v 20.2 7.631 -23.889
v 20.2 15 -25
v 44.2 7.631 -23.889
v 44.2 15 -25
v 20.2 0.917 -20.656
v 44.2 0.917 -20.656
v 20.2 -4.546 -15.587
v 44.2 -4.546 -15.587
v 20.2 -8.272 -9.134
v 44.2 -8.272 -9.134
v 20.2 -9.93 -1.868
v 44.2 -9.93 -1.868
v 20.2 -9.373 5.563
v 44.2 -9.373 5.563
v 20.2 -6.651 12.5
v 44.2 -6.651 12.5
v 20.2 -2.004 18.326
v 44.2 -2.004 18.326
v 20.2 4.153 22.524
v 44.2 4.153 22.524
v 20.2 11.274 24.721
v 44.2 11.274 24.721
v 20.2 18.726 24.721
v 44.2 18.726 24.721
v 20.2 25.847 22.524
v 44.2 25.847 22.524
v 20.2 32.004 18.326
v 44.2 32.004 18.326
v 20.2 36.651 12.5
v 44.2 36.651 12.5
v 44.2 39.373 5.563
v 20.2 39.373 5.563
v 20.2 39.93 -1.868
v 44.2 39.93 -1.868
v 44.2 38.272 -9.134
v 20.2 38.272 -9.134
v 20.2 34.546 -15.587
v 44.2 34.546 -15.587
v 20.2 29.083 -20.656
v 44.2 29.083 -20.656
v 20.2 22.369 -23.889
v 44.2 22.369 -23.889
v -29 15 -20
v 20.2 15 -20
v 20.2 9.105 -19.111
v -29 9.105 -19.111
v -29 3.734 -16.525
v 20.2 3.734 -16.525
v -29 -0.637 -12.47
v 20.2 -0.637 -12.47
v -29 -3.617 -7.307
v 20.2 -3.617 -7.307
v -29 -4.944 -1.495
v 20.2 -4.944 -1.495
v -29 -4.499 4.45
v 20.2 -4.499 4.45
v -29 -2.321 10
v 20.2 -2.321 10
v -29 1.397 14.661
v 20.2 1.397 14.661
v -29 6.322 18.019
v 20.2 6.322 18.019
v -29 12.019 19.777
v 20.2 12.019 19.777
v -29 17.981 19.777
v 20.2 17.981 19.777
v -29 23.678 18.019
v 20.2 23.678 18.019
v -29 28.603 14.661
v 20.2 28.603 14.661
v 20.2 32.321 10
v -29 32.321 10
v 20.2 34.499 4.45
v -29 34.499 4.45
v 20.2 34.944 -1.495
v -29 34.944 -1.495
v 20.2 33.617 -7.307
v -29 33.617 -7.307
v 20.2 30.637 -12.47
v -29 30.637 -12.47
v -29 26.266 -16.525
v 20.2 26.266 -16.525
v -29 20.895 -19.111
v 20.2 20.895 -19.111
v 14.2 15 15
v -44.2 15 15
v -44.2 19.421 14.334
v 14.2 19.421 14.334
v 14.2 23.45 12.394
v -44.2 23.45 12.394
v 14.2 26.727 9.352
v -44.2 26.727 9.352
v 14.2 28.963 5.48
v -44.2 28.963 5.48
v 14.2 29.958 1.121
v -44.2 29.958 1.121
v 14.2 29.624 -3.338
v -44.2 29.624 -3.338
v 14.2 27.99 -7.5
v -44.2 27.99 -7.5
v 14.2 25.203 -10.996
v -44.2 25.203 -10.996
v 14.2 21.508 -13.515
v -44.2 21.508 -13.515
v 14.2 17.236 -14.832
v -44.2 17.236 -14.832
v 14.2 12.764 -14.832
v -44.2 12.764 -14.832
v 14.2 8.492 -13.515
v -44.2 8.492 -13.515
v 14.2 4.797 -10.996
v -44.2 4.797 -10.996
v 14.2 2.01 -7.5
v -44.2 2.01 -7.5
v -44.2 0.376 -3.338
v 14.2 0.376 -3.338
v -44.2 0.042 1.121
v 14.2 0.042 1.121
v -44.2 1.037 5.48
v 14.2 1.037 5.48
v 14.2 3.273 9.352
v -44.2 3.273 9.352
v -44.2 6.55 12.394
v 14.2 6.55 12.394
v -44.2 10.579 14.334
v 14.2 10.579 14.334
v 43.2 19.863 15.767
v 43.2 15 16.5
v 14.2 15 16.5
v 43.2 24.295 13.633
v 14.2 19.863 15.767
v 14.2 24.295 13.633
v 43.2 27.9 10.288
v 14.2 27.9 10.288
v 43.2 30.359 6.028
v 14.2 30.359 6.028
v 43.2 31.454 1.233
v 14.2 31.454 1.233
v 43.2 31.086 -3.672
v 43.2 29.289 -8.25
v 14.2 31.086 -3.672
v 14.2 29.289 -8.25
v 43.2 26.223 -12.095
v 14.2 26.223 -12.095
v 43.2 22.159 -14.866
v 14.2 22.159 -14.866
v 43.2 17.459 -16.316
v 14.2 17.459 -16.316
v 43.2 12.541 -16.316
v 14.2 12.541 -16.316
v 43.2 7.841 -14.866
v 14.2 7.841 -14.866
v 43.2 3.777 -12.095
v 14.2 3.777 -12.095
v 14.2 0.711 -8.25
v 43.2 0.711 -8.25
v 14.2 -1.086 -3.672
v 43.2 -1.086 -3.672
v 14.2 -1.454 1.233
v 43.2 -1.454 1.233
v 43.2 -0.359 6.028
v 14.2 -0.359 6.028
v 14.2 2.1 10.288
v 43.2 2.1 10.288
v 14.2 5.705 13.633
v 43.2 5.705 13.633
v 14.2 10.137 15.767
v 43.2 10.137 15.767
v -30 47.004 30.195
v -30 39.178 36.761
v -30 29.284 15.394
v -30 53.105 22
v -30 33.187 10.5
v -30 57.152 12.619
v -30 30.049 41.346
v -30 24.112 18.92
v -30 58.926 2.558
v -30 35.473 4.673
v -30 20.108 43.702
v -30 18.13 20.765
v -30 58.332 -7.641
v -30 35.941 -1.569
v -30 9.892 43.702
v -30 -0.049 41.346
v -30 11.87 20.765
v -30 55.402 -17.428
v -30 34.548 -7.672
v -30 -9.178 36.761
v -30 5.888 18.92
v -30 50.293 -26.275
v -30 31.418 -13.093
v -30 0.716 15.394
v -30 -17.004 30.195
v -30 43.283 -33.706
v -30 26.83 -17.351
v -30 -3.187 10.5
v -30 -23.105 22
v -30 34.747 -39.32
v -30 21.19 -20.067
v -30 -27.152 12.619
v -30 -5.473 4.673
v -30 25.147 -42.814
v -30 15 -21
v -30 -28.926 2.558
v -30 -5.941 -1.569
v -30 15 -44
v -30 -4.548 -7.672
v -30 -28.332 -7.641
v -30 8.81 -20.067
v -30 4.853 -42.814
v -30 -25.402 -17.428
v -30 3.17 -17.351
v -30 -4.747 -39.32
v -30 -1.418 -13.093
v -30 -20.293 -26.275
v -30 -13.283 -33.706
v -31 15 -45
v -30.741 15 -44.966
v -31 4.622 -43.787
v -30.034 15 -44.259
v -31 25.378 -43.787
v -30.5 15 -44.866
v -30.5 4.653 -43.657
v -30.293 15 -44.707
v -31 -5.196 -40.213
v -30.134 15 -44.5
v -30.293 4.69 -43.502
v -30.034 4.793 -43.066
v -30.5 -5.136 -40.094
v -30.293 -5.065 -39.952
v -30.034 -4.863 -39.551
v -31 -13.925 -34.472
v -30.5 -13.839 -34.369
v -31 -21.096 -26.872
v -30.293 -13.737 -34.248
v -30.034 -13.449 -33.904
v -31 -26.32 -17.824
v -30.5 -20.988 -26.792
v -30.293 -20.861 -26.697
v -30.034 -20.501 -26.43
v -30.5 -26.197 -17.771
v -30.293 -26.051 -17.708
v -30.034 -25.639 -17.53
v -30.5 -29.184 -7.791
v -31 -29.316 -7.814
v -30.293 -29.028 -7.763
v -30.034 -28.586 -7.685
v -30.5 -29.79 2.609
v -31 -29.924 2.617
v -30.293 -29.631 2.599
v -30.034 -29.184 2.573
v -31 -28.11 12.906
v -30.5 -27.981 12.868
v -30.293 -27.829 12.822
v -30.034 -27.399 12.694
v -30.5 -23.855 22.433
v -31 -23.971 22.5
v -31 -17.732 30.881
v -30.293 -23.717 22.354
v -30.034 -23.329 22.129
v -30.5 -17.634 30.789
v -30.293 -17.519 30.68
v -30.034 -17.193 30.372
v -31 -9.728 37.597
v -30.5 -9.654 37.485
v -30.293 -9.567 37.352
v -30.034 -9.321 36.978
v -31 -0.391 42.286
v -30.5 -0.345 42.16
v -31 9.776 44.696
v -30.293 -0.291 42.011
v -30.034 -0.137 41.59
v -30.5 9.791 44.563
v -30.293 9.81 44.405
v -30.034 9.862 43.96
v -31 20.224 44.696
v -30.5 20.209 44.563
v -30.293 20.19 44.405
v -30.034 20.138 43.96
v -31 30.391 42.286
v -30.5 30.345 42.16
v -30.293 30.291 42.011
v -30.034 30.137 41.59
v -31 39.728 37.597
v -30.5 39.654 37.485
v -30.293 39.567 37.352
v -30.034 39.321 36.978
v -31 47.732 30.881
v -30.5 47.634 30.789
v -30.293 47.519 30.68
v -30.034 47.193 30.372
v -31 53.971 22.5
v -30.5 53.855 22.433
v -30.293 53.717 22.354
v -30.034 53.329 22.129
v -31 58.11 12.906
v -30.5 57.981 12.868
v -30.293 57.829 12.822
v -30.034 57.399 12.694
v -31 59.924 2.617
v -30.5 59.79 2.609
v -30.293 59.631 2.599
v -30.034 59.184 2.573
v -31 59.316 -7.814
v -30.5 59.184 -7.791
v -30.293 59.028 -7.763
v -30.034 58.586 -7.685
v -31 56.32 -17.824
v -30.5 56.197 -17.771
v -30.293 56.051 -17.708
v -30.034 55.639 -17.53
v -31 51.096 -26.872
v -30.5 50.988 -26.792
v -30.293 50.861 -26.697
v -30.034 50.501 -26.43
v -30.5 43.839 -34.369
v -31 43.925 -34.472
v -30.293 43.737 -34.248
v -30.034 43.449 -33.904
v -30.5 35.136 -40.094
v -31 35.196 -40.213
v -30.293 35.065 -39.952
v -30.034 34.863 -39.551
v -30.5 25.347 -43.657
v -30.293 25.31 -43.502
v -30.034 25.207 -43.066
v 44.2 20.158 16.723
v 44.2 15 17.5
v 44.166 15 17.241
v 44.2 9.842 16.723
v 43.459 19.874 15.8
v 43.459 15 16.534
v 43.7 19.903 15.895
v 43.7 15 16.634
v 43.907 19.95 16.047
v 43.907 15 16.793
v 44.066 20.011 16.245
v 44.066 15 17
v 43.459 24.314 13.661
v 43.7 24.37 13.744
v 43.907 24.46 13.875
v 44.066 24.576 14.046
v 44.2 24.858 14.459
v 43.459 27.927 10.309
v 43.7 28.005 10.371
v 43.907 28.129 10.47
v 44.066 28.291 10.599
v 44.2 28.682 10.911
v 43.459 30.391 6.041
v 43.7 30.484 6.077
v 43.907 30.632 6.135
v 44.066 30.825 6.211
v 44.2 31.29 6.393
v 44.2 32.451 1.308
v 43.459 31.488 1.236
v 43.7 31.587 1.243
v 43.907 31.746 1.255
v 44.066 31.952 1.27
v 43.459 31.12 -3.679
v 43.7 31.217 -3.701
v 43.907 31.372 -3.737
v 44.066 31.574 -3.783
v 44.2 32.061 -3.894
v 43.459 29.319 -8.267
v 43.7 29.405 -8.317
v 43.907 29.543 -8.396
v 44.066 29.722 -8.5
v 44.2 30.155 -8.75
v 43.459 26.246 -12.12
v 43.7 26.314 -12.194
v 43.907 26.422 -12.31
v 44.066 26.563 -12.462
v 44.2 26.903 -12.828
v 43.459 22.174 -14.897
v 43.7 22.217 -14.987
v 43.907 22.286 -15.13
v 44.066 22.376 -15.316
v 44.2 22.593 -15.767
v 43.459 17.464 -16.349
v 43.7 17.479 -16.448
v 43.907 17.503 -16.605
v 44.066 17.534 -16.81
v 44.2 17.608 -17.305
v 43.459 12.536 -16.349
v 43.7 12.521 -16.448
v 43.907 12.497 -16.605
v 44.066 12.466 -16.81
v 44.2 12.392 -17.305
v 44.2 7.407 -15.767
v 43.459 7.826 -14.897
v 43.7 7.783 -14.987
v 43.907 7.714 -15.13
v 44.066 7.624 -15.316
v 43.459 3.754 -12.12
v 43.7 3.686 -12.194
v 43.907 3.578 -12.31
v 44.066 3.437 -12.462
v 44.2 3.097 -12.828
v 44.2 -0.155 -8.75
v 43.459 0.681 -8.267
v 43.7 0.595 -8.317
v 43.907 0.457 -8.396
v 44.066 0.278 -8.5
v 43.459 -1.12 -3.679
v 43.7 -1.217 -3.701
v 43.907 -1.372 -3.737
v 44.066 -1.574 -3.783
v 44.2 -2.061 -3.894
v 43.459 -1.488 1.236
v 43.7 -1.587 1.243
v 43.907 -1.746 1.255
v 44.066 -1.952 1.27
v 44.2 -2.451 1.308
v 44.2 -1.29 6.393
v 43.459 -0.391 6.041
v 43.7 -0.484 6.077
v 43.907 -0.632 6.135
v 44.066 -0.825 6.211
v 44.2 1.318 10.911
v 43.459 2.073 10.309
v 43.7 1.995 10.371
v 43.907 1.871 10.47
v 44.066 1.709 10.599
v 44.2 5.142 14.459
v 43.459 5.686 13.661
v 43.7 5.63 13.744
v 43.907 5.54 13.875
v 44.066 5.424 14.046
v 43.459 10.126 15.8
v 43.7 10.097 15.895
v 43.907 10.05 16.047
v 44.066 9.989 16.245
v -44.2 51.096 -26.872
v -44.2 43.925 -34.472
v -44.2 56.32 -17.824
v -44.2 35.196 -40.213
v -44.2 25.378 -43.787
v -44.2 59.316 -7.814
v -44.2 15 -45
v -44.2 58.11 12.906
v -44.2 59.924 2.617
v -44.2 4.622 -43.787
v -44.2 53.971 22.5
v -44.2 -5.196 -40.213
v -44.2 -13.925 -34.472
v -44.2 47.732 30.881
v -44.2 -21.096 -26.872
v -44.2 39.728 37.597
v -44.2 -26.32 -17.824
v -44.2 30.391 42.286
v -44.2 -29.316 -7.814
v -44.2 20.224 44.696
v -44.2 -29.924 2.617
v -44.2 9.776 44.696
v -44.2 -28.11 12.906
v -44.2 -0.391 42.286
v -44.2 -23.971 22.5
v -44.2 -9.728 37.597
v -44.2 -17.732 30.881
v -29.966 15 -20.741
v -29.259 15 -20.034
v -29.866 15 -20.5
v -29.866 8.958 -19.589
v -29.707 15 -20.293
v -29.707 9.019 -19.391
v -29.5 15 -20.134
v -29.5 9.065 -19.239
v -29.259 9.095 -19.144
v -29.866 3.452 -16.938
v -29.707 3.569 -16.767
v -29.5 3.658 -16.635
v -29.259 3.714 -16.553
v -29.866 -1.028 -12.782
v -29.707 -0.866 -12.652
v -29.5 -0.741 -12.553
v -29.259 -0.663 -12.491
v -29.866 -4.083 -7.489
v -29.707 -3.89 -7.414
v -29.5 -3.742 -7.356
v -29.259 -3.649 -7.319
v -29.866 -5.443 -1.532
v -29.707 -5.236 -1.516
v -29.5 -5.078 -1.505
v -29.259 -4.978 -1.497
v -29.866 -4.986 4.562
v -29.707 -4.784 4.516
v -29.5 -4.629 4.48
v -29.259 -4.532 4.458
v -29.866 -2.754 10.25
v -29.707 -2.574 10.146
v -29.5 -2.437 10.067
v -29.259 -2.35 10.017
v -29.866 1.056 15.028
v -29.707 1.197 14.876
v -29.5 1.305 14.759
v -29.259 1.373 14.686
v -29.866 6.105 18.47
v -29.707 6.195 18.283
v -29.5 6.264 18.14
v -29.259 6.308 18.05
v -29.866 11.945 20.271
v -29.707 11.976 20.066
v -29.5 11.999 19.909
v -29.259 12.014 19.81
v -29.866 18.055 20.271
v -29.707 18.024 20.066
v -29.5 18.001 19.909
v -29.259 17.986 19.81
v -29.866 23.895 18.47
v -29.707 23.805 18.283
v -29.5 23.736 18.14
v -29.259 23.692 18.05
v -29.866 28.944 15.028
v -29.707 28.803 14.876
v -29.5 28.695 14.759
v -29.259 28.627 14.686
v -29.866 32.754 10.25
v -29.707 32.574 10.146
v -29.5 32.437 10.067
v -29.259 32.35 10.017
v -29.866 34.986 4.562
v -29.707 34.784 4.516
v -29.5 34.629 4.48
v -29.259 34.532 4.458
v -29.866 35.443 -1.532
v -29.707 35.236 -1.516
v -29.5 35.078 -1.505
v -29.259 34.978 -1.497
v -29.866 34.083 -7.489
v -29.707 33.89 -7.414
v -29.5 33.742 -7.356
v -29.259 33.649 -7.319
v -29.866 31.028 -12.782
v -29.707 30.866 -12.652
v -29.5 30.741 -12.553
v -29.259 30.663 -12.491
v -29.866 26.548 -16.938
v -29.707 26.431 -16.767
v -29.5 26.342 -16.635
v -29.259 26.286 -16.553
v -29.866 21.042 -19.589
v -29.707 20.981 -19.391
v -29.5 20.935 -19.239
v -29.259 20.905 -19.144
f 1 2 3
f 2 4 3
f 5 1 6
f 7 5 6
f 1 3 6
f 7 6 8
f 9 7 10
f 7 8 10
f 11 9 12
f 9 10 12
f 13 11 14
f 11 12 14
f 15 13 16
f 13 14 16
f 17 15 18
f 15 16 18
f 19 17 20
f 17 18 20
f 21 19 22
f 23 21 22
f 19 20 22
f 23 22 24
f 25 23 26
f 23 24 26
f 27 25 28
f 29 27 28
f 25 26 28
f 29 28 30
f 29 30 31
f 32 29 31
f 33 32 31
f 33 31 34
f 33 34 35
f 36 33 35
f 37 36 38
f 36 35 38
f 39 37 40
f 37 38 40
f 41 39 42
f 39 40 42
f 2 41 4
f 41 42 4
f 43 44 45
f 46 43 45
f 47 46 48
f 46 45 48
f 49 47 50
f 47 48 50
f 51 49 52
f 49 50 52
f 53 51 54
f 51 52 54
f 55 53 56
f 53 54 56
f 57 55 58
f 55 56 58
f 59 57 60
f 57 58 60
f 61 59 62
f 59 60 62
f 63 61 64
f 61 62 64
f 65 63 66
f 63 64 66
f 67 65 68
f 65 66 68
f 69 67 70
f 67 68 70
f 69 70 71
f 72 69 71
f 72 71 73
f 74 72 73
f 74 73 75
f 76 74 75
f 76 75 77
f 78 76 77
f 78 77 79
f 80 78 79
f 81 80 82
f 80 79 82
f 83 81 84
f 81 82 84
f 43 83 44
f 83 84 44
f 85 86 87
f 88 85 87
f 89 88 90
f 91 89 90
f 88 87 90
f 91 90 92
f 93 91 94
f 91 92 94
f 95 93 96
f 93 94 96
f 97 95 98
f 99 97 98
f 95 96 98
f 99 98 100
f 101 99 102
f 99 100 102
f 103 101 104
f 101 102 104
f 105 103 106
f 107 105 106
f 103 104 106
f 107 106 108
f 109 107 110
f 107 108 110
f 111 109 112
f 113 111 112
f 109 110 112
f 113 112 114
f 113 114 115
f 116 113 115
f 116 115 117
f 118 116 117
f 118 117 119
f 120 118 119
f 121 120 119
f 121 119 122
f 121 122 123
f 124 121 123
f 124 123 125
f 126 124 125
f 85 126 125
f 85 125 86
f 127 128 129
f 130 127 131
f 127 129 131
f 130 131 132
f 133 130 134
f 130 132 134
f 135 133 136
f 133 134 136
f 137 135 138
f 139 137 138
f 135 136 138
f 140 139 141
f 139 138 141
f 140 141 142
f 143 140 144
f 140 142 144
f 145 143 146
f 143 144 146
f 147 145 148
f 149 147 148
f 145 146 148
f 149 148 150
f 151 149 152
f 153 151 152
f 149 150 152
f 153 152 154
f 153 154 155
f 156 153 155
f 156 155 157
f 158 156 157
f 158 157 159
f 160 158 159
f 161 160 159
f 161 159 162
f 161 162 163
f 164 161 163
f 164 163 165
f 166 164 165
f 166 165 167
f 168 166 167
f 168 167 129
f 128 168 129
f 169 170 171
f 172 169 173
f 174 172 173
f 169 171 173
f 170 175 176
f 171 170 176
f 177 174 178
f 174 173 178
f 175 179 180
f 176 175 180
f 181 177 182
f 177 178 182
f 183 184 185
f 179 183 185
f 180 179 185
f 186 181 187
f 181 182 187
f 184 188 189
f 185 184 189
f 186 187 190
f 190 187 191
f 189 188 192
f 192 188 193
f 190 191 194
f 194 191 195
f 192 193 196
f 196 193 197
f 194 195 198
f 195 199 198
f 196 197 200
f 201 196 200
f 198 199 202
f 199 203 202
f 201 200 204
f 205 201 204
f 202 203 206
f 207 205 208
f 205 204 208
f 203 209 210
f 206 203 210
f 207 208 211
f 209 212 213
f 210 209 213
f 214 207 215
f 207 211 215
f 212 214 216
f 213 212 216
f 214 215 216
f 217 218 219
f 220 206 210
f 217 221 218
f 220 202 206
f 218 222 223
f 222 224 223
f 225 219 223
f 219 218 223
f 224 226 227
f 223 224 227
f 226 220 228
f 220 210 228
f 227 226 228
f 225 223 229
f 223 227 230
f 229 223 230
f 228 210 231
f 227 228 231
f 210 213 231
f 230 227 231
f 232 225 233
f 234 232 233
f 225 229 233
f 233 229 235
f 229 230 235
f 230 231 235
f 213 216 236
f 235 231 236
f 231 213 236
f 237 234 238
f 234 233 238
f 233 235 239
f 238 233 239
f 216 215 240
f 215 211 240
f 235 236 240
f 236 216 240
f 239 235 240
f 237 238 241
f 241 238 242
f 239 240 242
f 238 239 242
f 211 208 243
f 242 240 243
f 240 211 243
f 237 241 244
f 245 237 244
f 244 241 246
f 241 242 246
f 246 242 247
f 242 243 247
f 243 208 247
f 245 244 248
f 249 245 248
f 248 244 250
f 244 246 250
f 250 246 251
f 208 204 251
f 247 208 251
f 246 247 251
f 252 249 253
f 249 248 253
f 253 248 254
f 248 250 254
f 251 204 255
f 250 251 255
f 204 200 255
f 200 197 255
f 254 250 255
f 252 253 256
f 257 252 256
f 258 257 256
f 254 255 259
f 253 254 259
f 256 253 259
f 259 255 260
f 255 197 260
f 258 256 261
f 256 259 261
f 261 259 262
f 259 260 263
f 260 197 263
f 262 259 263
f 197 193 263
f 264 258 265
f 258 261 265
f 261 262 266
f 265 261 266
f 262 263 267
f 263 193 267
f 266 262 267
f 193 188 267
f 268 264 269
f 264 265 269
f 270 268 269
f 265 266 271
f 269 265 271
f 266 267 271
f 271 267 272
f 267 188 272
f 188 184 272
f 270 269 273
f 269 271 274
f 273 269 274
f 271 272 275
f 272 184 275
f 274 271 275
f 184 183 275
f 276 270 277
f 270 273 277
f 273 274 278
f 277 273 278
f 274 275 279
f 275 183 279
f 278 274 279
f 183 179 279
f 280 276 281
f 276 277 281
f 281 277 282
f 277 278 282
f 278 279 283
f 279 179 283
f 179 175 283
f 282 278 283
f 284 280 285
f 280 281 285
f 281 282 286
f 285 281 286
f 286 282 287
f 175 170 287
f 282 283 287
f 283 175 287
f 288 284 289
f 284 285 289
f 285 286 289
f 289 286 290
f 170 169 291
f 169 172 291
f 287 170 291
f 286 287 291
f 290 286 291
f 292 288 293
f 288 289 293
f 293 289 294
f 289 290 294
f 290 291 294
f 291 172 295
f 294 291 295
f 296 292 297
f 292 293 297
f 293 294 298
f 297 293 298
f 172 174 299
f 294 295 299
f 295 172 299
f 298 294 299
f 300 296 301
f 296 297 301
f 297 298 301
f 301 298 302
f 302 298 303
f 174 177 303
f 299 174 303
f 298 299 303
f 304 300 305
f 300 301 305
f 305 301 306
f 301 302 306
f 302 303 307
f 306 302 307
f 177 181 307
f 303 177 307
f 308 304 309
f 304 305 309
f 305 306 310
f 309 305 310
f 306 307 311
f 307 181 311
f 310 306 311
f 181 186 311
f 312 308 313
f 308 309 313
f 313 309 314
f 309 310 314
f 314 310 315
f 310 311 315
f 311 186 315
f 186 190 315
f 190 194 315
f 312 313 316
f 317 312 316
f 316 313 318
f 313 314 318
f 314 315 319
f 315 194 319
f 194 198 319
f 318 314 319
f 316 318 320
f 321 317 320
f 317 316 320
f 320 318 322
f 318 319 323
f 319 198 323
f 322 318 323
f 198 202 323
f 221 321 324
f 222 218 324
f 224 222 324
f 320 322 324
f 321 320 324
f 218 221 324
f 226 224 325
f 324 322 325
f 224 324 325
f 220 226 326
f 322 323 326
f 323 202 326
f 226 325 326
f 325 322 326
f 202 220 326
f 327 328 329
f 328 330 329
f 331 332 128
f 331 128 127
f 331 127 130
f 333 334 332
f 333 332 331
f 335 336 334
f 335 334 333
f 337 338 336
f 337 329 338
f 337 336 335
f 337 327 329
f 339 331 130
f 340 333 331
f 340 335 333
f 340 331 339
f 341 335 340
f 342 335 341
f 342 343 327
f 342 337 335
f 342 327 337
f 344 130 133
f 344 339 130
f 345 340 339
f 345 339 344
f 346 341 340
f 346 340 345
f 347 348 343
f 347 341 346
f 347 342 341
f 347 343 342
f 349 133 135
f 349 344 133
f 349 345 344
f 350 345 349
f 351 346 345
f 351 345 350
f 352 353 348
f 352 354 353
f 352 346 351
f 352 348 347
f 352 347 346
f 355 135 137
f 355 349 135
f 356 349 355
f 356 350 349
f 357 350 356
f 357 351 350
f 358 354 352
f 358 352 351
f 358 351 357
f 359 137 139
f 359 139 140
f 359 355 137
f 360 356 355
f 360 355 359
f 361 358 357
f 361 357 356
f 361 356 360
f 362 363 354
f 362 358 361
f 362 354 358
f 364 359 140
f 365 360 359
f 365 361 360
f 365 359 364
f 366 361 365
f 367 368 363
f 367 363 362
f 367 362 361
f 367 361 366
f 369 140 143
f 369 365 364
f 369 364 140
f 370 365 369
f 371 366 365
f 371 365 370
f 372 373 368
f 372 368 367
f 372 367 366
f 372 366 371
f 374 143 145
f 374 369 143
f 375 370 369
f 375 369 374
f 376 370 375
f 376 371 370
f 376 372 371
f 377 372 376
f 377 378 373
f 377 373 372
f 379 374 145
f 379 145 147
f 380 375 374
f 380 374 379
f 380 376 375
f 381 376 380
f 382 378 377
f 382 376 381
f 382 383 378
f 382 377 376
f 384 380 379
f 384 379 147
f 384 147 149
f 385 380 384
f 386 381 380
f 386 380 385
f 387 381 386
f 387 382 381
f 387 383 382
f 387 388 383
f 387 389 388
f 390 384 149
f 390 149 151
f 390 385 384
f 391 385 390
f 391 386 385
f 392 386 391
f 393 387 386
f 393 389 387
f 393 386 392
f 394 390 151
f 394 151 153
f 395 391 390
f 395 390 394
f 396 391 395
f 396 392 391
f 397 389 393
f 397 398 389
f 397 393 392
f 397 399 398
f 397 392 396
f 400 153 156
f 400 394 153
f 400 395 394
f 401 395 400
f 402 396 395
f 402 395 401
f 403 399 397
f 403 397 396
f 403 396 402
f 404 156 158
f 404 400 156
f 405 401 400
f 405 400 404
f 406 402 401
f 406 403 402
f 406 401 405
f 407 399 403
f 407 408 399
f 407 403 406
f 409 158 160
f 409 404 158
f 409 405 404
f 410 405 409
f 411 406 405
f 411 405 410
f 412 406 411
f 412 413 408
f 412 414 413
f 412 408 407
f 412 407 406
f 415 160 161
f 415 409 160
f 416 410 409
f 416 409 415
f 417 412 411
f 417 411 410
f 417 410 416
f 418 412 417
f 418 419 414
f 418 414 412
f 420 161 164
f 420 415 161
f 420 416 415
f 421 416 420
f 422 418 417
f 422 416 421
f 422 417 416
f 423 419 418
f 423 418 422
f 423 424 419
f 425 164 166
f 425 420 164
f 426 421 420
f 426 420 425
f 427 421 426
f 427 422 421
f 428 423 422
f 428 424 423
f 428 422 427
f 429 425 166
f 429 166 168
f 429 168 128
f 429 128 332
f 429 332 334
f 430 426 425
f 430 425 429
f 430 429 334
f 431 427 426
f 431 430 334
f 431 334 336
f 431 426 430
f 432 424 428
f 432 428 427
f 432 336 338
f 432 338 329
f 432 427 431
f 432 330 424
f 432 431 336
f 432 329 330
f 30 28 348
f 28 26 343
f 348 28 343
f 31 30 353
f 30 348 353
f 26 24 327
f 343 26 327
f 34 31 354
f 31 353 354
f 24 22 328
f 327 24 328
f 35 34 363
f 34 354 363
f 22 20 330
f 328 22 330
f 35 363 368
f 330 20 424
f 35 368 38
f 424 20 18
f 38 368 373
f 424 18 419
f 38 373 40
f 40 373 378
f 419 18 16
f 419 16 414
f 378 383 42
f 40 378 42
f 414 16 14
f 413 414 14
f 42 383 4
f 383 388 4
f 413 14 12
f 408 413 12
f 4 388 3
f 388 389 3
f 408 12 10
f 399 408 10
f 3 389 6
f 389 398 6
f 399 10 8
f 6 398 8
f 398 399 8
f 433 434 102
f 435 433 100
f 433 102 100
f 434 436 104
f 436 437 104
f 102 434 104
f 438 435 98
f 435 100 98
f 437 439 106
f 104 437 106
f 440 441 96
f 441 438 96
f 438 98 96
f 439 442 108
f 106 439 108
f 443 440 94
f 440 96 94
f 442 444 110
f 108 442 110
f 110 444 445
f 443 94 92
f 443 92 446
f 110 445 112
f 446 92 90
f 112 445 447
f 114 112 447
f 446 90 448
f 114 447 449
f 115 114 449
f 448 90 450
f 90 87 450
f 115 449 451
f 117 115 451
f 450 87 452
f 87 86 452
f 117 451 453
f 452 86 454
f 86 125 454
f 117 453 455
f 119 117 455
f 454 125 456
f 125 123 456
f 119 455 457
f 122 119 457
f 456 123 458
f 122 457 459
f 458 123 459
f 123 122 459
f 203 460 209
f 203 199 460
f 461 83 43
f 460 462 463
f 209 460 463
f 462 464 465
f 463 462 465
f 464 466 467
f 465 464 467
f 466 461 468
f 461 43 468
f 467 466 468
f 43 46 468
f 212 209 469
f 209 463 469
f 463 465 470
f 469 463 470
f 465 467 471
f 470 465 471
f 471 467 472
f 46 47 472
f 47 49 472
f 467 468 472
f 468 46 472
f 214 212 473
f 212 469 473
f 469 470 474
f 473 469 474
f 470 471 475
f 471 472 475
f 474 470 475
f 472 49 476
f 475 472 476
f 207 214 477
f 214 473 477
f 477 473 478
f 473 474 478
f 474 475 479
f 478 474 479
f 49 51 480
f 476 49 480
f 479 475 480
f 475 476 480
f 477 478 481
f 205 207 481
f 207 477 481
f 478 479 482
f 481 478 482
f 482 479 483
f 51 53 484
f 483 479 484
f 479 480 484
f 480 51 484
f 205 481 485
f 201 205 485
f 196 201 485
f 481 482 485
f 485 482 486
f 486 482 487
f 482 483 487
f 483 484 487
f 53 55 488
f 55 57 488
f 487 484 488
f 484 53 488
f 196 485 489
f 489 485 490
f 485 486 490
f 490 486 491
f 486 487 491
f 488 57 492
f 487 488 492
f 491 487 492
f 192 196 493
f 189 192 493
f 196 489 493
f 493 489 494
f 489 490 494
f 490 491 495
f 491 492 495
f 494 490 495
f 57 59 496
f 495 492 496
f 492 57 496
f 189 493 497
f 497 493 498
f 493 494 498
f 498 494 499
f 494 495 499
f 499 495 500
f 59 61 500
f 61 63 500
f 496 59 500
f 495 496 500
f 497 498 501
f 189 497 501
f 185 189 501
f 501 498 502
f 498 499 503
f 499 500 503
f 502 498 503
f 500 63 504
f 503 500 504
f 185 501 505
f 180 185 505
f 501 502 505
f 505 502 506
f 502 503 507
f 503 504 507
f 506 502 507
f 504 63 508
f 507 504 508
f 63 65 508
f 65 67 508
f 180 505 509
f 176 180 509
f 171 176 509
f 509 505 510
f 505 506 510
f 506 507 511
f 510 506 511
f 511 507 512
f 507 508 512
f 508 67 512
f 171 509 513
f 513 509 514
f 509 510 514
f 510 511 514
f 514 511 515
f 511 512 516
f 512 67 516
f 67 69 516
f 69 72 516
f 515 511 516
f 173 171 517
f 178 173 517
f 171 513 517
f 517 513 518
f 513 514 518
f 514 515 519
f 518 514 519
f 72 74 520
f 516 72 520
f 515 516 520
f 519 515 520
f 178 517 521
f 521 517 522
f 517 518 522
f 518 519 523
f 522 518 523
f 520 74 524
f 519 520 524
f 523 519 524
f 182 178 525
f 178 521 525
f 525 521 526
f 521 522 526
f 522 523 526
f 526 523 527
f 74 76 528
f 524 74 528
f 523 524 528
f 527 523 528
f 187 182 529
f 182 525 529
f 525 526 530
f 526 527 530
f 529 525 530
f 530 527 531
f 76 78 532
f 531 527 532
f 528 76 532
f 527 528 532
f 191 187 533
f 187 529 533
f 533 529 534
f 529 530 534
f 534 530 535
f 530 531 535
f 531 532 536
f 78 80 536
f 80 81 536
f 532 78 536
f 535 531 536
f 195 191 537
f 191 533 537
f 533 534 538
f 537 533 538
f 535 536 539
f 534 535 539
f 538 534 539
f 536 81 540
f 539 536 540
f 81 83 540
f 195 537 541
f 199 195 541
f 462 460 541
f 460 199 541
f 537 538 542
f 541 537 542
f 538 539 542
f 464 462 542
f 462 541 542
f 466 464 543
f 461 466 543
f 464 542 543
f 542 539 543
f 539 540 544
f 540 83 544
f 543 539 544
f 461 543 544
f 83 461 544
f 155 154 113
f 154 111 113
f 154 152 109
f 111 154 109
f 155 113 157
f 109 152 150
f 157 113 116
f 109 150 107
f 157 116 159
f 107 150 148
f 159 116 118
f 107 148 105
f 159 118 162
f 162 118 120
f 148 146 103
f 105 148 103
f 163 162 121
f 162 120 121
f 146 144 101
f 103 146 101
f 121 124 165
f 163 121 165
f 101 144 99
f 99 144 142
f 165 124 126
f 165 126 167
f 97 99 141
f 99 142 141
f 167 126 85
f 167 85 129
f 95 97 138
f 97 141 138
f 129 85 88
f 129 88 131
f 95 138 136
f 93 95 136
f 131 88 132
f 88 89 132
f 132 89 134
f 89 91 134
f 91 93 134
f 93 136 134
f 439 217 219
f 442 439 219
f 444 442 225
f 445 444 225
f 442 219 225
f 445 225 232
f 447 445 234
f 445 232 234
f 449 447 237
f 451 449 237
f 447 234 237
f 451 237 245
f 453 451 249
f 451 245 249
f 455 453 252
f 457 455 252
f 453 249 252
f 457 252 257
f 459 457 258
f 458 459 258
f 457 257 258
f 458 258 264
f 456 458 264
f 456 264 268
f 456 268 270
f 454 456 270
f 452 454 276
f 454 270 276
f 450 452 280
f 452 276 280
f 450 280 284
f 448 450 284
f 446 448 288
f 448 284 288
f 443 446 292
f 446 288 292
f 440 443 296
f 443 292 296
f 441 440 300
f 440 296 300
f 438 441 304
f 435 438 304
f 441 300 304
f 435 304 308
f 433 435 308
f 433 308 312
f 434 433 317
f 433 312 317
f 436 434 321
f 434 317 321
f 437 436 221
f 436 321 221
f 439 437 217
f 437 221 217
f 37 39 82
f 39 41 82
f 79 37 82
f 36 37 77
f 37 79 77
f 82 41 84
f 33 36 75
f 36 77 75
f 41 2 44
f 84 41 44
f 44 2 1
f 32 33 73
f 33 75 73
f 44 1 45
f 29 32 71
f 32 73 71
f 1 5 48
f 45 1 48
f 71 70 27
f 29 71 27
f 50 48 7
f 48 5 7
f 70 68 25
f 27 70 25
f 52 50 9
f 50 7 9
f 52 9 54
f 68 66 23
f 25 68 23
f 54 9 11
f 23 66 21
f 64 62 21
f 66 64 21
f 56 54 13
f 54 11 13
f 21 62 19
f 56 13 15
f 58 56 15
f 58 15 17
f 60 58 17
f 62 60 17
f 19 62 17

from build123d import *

# Parameters (mm, degrees)
HOLE1_D     = 30
HOLE2_D     = 33
HOLE2_DEPTH = 30
FILLET1_R   = 1


with BuildPart() as part:
    # Sketch1 → Revolve1 (revolve)
    with BuildSketch(Plane.XY, mode=Mode.PRIVATE) as revolve1_sk:
        Polygon((-44.2, 15), (-44.2, 60), (-30, 60), (-30, 35), (20.2, 35), (20.2, 40), (44.2, 40), (44.2, 15), align=None)
    revolve(revolve1_sk.sketch.rotate(Axis((44.2, 15, 0), (-1, 0, 0)), 90), axis=Axis((44.2, 15, 0), (-1, 0, 0)))

    # Hole1 (through all)
    with Locations(Plane(origin=(44.2, 0, 0), x_dir=(0, 0, -1), z_dir=(1, 0, 0))):
        with Locations((0, 15)):
            Hole(HOLE1_D / 2)

    # Hole2
    with Locations(Plane(origin=(44.2, 0, 0), x_dir=(0, 0, -1), z_dir=(1, 0, 0))):
        with Locations((0, 15)):
            Hole(HOLE2_D / 2, depth=HOLE2_DEPTH)

    # Fillet1
    fillet1_edges = [part.edges().sort_by_distance(p)[0] for p in [
        (44.2, 15, -16.5),
        (-30, 15, 20),
        (-30, 15, 45),
    ]]
    fillet(fillet1_edges, radius=FILLET1_R)


solid = part.part
